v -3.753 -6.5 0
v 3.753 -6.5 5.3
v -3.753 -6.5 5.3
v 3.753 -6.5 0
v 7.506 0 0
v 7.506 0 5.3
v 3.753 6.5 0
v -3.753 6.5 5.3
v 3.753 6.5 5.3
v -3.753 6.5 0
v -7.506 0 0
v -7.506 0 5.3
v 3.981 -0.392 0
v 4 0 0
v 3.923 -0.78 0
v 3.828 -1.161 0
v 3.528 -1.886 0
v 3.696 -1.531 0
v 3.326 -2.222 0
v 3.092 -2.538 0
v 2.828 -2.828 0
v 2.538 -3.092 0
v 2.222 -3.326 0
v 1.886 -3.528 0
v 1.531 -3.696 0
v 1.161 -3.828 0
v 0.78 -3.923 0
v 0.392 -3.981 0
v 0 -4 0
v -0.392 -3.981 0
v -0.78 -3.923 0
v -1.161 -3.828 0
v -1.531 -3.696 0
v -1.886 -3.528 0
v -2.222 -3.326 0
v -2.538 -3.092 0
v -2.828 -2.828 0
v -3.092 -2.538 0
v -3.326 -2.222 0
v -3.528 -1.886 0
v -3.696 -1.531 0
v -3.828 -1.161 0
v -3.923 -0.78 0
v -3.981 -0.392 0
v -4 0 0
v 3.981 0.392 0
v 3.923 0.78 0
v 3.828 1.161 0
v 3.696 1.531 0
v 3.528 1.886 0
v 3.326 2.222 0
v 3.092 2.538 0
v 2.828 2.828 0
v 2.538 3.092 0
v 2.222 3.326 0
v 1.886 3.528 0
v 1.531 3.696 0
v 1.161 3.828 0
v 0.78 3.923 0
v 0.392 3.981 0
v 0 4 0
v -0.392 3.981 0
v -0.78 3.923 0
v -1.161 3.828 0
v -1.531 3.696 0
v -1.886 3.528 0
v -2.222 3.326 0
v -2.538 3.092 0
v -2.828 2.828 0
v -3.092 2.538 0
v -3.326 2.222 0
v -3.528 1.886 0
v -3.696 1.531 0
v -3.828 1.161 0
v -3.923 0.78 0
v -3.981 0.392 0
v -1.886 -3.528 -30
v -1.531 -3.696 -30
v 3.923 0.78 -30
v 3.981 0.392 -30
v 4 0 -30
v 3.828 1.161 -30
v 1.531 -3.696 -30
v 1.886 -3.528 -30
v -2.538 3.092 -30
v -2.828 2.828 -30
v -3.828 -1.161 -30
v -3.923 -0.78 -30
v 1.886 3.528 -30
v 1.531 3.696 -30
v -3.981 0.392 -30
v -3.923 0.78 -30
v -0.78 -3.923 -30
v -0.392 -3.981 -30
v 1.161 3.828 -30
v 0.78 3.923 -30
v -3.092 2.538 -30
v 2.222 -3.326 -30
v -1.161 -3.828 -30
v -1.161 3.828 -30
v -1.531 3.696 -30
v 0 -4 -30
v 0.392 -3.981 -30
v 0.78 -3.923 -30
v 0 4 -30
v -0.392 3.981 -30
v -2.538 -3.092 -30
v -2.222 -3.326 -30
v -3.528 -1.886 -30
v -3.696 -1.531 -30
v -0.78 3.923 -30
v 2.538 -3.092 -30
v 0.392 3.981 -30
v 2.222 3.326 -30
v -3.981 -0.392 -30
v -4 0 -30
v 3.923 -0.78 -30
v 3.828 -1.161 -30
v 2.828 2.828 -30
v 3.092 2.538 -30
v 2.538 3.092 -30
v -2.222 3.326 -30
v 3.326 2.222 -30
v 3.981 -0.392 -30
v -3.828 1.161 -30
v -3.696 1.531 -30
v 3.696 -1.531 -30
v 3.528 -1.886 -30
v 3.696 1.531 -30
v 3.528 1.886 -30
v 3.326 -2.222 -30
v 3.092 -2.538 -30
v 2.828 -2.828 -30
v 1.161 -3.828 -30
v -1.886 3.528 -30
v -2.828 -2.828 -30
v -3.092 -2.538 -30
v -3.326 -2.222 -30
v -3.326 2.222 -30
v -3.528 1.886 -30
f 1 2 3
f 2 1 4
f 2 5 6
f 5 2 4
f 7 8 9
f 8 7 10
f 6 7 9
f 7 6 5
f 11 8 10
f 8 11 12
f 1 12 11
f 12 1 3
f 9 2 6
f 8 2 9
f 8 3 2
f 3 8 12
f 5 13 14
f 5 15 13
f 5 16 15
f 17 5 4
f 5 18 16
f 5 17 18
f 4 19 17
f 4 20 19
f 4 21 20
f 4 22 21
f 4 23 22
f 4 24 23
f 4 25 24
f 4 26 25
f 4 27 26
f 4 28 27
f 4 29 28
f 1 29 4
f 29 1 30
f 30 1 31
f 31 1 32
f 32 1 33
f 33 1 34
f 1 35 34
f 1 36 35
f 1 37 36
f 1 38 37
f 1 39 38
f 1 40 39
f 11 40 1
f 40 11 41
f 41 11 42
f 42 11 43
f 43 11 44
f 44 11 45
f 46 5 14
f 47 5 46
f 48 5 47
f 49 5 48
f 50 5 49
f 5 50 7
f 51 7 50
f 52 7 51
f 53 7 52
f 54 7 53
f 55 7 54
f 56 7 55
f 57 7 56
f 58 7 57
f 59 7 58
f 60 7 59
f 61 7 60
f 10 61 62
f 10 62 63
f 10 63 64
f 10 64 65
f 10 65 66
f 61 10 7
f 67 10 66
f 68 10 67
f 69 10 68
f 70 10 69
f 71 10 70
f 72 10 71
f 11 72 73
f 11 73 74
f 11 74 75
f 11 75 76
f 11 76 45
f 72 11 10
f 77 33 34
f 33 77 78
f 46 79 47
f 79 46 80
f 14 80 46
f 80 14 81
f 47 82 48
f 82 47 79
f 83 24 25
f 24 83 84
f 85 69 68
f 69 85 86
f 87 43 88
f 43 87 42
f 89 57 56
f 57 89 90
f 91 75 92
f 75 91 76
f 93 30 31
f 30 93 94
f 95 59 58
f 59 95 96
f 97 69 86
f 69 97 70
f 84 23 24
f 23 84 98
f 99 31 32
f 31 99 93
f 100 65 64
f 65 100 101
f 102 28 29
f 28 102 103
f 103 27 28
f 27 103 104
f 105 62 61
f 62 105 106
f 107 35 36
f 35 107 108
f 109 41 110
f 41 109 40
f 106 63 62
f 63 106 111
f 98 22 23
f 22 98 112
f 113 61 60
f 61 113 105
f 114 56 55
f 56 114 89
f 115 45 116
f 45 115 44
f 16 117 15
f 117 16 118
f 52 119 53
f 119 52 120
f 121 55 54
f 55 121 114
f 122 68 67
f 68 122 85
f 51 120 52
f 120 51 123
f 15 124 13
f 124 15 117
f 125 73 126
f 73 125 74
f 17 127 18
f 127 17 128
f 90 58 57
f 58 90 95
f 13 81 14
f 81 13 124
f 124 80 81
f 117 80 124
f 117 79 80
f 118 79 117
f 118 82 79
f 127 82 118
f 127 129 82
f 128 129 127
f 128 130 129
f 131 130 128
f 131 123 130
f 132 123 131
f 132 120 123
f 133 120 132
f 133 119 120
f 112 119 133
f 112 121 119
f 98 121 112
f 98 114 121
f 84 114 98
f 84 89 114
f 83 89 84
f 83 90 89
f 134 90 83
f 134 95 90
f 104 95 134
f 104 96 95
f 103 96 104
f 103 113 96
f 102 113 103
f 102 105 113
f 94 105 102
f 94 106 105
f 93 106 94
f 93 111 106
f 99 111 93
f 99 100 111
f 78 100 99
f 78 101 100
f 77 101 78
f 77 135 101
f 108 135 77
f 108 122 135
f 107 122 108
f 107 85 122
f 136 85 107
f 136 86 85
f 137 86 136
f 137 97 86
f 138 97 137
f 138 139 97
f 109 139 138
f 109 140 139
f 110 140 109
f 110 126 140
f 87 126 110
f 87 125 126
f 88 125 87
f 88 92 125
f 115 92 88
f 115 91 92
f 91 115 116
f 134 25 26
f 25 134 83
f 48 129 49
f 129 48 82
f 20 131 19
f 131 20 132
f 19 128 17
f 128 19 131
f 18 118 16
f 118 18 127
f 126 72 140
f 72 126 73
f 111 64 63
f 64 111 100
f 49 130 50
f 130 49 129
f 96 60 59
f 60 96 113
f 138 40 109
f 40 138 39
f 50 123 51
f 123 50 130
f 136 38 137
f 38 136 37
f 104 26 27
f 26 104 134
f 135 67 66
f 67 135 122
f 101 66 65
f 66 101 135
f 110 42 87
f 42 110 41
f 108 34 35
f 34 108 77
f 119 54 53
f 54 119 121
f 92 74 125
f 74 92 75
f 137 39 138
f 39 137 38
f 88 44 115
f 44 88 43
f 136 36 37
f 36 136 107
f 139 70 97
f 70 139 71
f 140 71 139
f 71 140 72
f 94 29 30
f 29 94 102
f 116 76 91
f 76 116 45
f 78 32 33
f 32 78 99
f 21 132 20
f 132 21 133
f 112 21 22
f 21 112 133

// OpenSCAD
// M8 Hex Bolt (ISO standard, simplified without thread)
// Head: hex prism, across-flats 13mm, height 5.3mm
// Shank: cylinder, diameter 8mm, length 30mm

$fn = 64;

// Head dimensions
head_af = 13;        // across-flats distance
head_height = 5.3;   // head height

// Shank dimensions
shank_diameter = 8;
shank_length = 30;

// Hex head (centered, bottom at z=0)
translate([0, 0, 0])
    cylinder(h = head_height, r = head_af / sqrt(3), $fn = 6);

// Shank (extends in -Z direction)
translate([0, 0, -shank_length])
    cylinder(h = shank_length, d = shank_diameter);
